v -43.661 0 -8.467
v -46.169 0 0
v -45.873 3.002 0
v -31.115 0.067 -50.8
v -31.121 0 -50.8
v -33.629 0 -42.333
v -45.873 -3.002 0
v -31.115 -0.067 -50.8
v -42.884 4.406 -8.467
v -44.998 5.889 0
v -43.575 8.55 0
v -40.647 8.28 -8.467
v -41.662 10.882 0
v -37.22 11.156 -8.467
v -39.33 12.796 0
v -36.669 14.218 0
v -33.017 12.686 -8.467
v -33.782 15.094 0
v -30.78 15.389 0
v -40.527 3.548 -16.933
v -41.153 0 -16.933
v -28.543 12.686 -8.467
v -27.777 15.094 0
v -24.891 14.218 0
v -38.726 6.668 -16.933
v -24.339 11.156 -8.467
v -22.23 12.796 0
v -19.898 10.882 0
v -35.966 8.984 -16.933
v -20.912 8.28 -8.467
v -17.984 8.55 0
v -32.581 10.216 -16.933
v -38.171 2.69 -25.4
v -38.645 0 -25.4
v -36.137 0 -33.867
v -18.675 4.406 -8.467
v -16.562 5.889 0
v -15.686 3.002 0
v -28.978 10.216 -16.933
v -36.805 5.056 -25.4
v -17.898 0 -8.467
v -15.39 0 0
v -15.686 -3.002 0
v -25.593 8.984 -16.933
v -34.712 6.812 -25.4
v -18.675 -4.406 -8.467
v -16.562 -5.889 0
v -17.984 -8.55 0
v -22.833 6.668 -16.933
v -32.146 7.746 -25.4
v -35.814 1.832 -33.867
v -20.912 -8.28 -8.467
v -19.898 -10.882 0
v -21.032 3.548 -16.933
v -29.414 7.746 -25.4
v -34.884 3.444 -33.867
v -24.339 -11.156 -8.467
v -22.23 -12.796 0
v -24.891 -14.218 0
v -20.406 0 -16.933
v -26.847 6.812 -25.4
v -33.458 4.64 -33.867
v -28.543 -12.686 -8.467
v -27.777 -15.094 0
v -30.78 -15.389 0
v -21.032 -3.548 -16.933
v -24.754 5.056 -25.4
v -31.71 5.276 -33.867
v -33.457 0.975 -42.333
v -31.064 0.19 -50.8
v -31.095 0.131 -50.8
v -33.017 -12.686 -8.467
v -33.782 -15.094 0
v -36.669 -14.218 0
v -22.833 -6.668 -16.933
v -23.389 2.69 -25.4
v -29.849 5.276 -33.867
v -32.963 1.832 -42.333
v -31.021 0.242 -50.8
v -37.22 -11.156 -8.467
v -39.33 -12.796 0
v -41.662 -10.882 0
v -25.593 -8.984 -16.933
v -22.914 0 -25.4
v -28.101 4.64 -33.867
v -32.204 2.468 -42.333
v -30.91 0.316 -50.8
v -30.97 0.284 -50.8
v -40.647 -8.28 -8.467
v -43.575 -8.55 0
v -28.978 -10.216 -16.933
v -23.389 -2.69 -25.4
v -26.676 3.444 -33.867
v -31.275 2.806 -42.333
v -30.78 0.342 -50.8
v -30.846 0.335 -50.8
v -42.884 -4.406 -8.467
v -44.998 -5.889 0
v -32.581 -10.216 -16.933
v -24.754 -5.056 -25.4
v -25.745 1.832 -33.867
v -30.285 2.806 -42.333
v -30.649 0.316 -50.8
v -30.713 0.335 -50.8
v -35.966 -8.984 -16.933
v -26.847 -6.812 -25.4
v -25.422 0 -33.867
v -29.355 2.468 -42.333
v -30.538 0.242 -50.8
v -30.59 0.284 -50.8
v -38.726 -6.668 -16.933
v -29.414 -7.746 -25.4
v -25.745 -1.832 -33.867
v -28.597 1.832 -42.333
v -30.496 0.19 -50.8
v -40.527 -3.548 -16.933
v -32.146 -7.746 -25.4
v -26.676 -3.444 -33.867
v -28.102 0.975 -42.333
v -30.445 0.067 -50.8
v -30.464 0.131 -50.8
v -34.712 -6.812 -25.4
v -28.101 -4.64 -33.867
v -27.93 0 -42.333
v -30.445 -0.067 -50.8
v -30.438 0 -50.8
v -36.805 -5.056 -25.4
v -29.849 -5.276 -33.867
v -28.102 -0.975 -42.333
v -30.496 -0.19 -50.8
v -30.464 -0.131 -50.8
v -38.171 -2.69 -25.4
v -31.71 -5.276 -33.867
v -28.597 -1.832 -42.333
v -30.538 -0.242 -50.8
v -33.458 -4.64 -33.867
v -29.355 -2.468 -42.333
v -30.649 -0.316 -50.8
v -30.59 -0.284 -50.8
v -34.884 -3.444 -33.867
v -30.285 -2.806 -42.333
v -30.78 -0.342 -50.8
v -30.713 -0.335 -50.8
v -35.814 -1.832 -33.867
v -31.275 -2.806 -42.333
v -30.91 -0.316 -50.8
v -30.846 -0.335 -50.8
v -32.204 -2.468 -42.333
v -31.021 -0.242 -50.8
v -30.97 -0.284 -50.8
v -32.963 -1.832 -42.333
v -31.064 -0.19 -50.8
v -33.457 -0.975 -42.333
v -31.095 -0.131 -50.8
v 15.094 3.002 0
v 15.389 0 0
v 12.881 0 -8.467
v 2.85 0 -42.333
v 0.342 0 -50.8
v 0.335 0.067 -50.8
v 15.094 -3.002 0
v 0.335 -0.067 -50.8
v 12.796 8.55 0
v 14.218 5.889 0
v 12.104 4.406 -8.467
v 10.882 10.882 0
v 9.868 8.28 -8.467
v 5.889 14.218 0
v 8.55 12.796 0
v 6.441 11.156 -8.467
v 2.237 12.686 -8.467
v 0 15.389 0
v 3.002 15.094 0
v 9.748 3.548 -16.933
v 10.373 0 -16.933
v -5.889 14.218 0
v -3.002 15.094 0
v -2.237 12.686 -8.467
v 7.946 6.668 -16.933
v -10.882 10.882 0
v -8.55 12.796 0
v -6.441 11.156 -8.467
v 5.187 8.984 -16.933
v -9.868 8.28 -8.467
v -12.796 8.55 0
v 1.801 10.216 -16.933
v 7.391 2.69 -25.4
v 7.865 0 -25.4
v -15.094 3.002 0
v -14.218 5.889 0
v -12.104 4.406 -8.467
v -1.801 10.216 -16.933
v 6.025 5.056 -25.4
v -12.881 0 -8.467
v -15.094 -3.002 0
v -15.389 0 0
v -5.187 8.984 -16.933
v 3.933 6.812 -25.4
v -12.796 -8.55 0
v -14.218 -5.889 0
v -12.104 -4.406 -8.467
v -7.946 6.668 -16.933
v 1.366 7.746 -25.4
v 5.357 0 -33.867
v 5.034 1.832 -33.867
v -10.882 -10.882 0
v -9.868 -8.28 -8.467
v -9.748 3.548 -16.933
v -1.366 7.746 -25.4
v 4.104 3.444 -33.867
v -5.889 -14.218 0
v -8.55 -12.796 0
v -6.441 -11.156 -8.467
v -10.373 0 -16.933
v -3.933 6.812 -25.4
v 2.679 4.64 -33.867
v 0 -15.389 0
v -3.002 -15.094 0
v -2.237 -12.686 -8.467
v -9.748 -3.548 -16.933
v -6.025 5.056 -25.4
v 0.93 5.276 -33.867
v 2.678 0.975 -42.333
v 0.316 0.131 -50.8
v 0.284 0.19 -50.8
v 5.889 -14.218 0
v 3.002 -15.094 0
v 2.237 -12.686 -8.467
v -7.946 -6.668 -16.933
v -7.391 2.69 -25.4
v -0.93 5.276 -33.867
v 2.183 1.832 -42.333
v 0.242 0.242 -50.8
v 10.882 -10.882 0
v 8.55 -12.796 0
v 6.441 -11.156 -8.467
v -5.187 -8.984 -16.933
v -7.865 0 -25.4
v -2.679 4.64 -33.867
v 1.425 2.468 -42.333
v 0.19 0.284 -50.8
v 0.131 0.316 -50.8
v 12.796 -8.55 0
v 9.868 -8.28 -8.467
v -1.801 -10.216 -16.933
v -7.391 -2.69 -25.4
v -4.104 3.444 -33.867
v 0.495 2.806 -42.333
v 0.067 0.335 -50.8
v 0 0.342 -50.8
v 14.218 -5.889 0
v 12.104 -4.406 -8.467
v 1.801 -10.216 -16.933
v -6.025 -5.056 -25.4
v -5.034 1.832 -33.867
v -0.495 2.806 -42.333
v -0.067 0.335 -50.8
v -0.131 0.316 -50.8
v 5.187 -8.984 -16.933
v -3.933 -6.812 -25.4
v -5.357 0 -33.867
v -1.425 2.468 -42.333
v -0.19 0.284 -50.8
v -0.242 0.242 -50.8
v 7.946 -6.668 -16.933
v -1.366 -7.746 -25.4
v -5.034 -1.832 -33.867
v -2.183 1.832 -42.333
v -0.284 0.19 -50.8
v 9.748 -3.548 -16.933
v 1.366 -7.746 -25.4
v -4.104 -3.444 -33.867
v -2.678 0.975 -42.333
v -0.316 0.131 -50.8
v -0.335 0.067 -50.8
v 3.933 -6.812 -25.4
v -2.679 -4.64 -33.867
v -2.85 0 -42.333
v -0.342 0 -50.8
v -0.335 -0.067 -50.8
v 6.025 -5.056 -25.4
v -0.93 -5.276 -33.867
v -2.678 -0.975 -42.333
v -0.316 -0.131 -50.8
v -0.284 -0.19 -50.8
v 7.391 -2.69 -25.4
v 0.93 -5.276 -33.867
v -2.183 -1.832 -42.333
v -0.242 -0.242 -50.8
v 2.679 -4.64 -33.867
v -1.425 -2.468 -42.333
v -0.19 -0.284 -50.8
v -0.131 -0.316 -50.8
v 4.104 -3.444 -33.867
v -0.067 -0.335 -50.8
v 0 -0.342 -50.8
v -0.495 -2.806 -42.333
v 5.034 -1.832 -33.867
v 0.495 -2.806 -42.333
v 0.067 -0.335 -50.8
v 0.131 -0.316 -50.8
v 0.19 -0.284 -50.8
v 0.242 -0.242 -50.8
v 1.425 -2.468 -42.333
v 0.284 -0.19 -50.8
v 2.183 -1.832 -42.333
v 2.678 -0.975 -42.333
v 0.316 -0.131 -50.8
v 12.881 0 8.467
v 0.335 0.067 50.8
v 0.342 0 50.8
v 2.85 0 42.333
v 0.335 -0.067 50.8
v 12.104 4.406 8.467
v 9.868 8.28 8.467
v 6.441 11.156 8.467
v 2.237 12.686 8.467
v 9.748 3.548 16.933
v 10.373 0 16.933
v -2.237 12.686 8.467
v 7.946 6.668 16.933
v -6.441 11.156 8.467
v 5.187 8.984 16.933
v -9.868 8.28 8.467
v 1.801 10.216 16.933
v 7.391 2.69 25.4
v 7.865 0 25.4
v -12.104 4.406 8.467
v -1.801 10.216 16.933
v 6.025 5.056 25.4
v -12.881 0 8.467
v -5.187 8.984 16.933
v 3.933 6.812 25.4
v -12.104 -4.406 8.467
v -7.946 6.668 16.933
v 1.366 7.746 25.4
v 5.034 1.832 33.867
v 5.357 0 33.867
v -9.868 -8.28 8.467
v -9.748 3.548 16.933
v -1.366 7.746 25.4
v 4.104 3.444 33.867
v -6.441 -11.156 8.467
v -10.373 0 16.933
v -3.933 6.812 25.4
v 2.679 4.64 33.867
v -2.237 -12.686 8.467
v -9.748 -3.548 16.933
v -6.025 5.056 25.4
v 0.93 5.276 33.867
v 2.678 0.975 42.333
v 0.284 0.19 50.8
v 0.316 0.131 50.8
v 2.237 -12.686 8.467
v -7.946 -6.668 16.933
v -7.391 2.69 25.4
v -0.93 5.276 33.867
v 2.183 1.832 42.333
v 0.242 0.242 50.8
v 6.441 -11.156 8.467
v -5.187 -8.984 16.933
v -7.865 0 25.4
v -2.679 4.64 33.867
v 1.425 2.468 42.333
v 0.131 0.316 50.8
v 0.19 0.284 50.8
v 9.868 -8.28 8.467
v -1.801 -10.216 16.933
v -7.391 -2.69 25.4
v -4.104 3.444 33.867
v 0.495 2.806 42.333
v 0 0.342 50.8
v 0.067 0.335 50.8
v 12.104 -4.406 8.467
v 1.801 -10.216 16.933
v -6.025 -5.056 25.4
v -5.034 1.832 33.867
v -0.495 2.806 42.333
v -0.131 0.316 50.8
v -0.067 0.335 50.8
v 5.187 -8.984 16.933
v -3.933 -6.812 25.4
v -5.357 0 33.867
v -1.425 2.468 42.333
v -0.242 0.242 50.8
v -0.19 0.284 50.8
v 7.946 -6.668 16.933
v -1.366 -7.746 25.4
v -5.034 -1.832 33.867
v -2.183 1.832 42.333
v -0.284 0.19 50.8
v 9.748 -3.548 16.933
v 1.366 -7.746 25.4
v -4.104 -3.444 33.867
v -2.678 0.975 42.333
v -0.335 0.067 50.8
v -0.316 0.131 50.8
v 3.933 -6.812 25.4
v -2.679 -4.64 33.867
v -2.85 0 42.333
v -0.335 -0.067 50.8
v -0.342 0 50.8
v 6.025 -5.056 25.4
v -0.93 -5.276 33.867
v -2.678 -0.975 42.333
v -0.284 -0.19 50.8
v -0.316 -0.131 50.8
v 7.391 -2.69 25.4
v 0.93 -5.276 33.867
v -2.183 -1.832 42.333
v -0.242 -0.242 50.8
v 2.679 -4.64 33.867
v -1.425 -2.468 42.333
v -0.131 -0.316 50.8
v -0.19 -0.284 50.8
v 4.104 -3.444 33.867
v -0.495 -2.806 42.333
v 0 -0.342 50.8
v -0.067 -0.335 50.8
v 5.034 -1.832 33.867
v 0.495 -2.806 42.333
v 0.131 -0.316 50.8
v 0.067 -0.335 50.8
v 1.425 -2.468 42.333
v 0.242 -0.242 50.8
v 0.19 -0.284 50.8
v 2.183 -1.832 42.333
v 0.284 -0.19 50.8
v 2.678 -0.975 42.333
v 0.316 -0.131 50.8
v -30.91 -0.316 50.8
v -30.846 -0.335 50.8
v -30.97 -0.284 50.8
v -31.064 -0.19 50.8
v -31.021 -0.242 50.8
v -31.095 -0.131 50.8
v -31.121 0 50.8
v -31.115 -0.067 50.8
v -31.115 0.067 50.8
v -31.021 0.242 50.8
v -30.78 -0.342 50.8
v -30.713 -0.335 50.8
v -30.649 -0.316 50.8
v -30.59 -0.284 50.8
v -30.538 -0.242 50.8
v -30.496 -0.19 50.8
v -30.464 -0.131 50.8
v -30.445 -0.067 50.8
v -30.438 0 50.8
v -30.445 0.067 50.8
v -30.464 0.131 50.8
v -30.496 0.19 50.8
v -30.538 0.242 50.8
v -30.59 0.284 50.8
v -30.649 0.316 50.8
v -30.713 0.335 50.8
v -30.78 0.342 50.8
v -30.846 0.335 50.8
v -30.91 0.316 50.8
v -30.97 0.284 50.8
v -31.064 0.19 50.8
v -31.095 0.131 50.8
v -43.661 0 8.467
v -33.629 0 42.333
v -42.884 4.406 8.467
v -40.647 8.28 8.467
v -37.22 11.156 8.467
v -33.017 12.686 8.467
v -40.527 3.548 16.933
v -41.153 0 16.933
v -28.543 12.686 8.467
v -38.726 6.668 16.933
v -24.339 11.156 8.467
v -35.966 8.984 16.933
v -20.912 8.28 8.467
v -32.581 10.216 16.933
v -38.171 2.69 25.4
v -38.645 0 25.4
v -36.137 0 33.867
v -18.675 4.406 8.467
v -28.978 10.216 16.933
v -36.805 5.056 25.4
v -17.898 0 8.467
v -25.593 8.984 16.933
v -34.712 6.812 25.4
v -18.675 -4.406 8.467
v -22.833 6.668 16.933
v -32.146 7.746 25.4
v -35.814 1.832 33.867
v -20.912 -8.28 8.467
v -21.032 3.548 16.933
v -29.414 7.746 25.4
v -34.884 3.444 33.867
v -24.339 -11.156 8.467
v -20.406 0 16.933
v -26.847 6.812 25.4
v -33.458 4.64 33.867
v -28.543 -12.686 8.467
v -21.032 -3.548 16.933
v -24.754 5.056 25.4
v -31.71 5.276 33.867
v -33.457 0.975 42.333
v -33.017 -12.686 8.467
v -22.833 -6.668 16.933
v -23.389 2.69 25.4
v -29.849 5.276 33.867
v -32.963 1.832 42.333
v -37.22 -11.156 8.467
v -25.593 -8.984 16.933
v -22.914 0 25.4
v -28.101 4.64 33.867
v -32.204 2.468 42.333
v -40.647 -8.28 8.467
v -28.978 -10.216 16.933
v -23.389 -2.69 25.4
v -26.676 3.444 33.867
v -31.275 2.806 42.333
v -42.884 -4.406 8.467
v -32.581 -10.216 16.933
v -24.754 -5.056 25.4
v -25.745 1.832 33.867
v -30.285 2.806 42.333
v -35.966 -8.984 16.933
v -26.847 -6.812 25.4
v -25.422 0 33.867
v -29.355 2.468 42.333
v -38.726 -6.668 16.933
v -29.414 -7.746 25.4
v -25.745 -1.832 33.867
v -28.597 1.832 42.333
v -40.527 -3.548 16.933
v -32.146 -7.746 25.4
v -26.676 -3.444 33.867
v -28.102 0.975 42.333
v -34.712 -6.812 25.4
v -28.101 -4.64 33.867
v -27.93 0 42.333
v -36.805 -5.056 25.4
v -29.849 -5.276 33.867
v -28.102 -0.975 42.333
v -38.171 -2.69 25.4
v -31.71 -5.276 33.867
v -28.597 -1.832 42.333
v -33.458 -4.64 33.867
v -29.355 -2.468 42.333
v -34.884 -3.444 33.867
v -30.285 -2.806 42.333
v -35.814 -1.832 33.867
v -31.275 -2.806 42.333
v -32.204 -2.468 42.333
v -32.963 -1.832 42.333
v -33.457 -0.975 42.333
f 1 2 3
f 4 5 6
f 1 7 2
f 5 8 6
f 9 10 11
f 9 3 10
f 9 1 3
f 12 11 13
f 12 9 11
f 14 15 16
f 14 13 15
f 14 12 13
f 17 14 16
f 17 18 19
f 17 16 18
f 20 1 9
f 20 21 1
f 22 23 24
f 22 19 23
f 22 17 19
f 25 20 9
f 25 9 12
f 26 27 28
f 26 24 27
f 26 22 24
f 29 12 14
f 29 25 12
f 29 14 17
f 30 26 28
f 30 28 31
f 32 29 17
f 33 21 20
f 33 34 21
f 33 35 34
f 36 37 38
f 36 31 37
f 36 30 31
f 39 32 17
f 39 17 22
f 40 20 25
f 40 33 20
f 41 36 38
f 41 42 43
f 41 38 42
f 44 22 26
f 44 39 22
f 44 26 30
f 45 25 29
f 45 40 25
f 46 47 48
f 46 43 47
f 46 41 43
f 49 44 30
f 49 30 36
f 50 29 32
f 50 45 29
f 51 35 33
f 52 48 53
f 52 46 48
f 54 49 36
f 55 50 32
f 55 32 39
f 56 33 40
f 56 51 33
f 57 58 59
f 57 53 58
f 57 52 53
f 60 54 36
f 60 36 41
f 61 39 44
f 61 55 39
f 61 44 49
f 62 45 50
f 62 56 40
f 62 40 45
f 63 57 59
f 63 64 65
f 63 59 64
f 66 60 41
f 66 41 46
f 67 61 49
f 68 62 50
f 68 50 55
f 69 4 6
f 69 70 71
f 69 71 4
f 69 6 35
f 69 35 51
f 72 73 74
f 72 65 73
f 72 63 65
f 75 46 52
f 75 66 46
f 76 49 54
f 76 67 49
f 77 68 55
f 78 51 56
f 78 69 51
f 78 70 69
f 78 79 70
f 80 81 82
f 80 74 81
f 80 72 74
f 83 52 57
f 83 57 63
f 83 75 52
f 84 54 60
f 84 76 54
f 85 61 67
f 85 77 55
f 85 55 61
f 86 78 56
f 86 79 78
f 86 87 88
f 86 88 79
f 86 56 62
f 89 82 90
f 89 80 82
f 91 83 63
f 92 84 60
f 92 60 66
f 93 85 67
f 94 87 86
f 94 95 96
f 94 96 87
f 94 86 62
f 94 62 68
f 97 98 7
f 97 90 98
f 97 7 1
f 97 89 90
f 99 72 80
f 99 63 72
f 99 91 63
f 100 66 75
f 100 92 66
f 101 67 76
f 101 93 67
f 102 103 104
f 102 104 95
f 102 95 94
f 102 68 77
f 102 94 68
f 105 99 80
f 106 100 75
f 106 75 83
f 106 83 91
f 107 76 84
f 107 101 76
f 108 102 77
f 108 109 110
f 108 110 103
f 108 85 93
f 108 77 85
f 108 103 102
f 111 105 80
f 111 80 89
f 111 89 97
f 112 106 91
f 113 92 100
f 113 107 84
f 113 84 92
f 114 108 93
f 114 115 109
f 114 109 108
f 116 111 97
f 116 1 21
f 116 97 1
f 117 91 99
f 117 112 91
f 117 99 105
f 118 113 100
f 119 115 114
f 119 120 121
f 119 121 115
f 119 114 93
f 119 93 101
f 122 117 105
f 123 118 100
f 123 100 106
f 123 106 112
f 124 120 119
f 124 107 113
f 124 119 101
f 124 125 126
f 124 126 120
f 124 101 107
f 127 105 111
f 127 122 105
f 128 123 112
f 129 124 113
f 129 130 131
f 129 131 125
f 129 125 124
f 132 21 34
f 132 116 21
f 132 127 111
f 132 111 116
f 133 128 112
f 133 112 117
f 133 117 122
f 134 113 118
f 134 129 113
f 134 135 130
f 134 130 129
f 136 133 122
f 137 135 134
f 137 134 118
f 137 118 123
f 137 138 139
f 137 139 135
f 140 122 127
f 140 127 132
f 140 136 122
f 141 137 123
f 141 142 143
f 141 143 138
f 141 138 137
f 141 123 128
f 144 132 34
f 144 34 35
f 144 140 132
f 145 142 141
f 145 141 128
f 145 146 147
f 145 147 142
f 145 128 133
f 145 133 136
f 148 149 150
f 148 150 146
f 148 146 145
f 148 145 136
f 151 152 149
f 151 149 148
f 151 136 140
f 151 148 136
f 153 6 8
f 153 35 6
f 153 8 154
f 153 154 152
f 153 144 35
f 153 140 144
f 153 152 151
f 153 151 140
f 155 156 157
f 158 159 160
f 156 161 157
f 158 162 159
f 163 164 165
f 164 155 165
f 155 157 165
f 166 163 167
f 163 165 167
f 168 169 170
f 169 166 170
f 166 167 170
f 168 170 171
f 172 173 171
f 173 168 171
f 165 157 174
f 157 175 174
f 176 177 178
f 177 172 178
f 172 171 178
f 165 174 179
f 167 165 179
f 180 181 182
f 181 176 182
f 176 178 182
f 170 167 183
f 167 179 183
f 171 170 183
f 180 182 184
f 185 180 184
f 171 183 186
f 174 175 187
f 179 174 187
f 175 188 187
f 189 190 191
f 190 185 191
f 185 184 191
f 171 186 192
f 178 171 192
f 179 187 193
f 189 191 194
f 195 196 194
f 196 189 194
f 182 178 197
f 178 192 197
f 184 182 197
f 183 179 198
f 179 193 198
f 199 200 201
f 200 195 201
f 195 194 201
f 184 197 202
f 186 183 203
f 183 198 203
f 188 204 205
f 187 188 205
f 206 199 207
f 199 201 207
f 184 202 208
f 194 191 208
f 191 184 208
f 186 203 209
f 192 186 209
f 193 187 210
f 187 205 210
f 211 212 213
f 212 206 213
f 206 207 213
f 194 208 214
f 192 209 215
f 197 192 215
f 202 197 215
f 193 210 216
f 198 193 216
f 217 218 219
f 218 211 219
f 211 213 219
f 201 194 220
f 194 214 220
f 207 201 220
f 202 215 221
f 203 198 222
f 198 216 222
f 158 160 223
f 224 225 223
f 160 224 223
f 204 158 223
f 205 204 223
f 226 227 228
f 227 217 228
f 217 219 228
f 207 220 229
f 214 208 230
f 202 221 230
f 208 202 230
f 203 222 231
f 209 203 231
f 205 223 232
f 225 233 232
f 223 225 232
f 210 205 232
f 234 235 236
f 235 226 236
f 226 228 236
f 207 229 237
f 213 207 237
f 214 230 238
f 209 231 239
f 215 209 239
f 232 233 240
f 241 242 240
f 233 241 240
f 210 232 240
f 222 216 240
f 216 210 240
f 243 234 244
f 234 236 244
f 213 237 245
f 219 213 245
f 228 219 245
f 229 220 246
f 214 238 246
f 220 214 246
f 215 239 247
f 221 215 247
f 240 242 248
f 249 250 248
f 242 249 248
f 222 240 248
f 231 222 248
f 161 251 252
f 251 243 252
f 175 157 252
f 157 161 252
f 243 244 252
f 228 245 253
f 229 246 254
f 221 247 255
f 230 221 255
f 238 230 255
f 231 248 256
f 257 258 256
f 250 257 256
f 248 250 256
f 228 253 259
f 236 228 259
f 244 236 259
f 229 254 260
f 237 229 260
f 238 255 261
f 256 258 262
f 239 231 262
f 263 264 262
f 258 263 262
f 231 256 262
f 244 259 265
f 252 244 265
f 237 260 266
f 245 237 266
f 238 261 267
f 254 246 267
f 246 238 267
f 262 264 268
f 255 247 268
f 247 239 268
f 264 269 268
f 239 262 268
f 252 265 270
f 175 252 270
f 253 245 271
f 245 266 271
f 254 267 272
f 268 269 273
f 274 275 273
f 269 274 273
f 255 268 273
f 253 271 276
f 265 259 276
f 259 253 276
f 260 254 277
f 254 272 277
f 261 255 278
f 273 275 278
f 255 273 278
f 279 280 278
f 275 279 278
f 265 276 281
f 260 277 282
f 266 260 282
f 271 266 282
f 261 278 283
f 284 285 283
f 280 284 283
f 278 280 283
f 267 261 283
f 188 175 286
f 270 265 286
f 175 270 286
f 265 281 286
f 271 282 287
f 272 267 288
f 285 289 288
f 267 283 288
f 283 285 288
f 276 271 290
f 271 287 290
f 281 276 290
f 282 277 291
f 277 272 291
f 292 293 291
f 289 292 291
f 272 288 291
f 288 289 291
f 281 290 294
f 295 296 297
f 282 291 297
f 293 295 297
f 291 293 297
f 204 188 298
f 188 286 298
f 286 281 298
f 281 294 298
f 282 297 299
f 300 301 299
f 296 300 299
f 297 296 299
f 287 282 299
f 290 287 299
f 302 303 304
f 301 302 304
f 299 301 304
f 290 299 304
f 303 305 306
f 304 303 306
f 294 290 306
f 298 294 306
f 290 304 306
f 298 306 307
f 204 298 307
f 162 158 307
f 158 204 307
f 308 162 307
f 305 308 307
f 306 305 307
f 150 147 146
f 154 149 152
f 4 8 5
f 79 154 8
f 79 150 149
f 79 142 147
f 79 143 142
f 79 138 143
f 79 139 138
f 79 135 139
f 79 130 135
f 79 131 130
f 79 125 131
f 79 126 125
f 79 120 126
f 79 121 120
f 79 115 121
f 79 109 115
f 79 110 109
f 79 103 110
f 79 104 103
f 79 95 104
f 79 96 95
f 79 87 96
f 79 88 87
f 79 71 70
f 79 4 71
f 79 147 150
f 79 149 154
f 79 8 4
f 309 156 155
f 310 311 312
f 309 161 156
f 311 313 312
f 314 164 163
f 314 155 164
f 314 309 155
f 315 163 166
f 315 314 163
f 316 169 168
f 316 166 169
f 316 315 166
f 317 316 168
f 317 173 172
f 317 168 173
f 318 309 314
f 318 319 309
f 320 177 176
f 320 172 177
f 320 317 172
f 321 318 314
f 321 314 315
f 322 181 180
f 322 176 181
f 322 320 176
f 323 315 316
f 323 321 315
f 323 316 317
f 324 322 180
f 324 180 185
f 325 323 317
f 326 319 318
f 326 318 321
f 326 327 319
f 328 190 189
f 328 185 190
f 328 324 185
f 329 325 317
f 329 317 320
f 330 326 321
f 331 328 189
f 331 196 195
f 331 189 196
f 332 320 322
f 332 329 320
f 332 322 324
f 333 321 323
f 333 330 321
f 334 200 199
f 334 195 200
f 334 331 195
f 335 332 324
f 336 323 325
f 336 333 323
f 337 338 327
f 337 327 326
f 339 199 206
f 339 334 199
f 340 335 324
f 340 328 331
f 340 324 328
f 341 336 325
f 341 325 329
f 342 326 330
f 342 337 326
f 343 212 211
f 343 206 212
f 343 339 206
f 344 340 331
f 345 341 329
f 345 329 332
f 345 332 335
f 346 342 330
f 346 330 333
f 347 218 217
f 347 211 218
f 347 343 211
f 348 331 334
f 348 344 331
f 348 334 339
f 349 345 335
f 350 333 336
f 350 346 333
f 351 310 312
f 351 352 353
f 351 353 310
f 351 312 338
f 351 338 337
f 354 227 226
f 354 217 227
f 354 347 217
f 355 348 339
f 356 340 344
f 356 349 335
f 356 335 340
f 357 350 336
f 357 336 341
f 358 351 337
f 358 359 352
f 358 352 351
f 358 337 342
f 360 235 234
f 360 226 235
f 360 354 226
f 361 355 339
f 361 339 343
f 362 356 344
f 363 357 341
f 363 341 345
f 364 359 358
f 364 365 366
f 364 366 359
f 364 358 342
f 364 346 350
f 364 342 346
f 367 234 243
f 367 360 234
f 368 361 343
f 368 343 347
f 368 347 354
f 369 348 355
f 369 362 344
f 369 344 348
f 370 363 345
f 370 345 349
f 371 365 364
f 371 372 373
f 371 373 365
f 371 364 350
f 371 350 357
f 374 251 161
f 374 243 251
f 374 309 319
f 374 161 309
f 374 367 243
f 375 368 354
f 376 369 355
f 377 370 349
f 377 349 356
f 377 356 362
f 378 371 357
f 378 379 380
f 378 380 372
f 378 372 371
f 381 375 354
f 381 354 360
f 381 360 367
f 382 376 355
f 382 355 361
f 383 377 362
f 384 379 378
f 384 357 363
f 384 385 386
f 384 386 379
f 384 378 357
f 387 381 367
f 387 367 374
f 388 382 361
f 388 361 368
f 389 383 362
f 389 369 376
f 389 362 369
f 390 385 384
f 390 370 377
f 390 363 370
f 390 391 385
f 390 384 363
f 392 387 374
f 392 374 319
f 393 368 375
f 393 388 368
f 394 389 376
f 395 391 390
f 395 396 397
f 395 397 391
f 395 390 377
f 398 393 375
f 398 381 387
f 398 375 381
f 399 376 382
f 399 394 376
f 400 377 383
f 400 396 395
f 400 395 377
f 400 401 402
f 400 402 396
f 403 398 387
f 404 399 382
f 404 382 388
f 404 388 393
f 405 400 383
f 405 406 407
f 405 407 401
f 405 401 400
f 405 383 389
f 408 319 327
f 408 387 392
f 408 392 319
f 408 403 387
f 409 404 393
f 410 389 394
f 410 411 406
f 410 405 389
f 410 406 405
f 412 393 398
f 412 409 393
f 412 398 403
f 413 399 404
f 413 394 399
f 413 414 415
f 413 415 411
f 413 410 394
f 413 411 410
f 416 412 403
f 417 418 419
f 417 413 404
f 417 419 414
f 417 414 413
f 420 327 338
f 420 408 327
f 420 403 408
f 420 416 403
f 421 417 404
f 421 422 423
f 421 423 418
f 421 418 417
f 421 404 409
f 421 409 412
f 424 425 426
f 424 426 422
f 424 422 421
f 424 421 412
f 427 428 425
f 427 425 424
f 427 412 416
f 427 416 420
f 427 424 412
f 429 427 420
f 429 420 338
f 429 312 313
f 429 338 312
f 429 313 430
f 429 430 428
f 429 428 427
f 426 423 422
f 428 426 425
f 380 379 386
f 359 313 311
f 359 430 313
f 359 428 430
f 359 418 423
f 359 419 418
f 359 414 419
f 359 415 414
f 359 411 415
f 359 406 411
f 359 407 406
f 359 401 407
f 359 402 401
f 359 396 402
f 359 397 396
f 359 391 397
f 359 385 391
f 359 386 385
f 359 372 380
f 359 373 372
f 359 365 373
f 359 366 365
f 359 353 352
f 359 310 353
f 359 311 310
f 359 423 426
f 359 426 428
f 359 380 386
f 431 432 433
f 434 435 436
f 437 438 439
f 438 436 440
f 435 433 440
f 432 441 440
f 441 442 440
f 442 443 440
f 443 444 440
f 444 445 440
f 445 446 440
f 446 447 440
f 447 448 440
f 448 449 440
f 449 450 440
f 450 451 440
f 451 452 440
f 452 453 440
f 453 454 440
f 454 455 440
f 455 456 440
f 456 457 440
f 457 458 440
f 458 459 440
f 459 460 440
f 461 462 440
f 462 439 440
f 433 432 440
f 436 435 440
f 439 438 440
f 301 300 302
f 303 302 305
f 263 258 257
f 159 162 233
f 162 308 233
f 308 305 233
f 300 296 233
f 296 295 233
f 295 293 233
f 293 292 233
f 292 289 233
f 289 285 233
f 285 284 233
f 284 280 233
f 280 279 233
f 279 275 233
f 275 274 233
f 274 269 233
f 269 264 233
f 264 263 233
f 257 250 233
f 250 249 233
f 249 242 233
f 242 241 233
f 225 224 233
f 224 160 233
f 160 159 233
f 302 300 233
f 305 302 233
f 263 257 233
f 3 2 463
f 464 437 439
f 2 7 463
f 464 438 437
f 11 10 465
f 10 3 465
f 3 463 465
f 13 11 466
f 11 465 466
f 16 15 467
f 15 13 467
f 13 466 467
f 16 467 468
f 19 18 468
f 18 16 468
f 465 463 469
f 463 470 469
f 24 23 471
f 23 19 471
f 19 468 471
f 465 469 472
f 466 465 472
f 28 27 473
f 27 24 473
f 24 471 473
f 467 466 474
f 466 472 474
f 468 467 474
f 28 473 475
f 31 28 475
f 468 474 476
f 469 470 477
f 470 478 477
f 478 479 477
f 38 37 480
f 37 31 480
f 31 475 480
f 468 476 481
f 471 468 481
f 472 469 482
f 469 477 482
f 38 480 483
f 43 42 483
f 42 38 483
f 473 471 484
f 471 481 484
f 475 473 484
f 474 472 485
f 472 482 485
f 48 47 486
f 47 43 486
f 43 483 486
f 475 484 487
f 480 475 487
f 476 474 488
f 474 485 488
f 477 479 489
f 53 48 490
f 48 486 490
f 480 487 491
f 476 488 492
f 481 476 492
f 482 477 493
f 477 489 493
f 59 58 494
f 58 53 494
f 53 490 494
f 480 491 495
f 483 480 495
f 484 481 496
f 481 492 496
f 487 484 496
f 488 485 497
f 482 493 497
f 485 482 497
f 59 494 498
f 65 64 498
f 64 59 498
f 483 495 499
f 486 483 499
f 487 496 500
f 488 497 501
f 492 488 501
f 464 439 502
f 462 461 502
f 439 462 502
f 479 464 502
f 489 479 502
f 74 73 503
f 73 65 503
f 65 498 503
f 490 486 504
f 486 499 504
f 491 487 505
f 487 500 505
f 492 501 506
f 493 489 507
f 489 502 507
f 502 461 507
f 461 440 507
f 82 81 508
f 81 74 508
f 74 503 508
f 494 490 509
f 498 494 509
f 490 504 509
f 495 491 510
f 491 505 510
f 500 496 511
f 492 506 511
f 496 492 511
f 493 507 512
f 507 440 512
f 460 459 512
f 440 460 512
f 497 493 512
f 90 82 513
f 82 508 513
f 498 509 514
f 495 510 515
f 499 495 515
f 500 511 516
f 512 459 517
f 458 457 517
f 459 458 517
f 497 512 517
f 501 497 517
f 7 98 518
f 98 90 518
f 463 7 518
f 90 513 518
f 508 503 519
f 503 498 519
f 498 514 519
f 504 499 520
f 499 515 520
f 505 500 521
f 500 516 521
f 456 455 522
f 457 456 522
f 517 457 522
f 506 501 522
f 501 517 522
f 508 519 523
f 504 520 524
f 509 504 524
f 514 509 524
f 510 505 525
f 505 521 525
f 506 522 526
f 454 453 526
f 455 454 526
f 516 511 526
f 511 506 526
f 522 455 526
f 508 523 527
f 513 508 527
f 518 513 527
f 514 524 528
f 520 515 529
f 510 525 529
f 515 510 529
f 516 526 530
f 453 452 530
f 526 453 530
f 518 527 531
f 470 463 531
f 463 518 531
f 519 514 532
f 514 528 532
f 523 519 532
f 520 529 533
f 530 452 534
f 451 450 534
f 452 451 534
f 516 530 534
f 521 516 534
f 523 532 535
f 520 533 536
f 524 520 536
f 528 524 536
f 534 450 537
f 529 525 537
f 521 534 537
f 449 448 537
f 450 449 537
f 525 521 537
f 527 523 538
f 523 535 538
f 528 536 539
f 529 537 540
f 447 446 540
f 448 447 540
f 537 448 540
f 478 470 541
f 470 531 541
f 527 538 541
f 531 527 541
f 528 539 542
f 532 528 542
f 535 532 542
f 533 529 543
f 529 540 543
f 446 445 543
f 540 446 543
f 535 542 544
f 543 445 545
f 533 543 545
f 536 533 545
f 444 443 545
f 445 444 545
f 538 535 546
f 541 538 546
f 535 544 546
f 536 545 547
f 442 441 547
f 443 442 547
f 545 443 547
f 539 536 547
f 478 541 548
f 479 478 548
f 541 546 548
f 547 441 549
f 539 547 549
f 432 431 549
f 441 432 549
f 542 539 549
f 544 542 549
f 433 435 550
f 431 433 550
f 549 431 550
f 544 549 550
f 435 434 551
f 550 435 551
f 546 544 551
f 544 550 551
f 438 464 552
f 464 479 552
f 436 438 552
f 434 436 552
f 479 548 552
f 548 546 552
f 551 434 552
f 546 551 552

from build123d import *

# Parameters (mm, degrees)
F0_R     = 15.3892471325
F1_DEPTH = 50.8
F1_TAPER = 16.5


with BuildPart() as f1:
    # F0 (on Top) → F1 (new body)
    with BuildSketch(Plane.XY):
        Circle(F0_R)
    extrude(amount=F1_DEPTH, taper=F1_TAPER)

    # F2: F1 across plane


with BuildPart() as f1_1:
    add(f1.part)
    add(f1.part.mirror(Plane.XY))


with BuildPart() as f4_1:
    # F4: instance of F1
    add(f1_1.part.mirror(Plane.YZ.offset(-15.38986)))


solid = Compound([f1_1.part, f4_1.part])
